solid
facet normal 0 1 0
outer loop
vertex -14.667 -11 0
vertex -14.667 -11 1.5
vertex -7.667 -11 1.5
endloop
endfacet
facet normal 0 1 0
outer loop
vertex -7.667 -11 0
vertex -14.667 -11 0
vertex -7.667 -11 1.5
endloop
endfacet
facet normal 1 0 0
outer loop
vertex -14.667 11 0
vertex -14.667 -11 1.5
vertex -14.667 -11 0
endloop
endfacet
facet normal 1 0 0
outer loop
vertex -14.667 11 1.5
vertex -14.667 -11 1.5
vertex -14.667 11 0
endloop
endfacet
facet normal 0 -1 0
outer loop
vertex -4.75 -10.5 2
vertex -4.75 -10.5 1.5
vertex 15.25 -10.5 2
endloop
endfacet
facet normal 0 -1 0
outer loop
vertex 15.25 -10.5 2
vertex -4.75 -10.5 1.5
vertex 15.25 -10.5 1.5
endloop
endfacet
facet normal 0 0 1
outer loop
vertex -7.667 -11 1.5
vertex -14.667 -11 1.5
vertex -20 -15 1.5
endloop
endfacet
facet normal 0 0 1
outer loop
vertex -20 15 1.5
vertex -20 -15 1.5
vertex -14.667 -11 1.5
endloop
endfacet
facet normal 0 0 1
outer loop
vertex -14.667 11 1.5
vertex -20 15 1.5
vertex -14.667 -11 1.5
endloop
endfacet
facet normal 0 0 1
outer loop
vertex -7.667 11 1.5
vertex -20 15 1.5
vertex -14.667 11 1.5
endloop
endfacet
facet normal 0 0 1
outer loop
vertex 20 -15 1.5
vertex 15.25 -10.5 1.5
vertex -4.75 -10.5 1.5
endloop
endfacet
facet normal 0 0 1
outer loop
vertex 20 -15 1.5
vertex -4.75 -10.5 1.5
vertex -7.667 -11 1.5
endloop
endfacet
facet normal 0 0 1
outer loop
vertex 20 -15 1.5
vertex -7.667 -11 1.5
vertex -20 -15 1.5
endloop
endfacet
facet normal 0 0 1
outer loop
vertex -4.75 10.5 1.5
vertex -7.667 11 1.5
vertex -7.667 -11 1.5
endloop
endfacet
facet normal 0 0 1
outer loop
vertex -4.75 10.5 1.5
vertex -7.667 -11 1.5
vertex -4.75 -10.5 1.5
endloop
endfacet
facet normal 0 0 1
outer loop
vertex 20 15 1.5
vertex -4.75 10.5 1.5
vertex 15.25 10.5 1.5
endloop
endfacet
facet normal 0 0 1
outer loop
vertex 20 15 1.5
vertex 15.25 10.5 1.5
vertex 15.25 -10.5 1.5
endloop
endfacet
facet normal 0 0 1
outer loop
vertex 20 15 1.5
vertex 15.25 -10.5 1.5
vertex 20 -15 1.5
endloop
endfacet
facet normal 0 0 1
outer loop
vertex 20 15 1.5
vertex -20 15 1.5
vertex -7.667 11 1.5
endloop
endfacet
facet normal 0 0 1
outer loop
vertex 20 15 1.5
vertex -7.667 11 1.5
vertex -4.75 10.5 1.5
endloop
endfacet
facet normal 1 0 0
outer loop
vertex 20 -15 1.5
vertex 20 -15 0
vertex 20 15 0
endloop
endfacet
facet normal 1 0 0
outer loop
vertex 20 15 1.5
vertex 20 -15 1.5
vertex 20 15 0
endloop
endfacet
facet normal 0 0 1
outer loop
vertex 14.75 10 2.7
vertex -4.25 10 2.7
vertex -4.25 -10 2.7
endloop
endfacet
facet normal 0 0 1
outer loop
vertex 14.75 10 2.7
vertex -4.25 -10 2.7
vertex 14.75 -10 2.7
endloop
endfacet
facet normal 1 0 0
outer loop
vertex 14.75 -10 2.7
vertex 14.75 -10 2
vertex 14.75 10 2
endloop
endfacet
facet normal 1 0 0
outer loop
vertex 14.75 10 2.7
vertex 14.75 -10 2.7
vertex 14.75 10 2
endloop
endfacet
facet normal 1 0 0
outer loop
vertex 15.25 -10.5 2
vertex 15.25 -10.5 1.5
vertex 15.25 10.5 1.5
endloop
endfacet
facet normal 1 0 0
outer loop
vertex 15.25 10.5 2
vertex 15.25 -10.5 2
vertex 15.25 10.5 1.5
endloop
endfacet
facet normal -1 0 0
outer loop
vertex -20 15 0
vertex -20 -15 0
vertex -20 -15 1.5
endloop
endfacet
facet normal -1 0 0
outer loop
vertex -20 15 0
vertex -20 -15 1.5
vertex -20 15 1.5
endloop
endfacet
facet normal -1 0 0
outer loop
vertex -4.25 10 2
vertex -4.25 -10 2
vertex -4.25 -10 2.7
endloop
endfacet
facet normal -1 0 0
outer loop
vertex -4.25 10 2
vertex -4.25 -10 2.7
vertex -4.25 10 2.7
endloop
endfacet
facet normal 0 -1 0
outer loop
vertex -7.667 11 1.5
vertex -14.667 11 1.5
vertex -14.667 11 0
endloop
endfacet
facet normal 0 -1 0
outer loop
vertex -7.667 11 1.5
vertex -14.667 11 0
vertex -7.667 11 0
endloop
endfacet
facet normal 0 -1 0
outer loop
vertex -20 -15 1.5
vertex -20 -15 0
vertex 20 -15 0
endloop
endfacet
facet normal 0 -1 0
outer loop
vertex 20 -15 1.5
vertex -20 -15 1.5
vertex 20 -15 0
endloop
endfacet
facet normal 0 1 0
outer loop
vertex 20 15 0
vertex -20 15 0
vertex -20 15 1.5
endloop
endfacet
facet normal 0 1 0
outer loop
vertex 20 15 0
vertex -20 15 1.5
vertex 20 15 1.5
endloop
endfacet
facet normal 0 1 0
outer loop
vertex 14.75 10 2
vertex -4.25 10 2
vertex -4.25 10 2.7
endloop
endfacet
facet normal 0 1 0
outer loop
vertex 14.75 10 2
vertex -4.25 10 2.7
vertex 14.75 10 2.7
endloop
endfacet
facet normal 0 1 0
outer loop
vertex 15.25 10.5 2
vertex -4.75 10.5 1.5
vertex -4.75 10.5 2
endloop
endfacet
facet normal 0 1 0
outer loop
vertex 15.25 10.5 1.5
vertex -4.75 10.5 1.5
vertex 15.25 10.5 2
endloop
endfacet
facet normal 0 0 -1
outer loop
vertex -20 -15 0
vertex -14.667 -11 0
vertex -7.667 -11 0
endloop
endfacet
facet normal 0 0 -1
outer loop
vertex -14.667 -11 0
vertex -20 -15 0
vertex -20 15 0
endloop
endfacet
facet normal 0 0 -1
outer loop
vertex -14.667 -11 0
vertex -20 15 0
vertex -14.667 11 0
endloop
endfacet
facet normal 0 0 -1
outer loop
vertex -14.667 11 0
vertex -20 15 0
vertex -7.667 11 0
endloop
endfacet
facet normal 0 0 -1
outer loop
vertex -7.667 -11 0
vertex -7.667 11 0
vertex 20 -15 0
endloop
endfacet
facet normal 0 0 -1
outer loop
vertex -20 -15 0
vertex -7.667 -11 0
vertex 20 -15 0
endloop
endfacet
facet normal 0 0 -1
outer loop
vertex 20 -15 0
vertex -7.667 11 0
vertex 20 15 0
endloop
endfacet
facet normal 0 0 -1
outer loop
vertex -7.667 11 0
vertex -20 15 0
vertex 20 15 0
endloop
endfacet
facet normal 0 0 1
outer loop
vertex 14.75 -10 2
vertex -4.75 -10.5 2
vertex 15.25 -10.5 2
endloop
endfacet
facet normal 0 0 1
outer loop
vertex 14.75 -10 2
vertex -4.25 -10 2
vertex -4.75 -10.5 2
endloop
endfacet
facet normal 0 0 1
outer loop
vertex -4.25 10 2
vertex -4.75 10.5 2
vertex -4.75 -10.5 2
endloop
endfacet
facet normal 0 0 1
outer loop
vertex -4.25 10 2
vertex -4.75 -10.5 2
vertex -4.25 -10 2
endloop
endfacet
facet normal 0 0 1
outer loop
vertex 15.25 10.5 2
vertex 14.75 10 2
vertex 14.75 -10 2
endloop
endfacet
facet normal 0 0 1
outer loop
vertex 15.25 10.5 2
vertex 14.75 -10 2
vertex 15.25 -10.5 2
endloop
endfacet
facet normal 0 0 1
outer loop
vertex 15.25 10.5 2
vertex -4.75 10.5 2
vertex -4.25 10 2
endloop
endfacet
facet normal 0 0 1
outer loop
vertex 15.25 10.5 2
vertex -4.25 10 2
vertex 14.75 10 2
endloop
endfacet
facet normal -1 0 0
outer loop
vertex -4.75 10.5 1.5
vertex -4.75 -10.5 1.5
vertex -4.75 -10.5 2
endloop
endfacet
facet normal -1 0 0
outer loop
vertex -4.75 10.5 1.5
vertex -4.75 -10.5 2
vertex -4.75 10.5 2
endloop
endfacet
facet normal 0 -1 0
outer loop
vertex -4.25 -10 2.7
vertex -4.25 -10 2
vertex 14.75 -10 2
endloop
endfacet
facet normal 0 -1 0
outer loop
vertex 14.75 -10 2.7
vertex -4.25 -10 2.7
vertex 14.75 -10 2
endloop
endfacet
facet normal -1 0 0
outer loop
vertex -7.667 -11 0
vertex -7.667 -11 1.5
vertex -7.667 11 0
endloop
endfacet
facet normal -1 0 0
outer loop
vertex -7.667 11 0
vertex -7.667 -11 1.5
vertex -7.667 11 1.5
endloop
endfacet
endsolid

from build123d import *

# Parameters (mm, degrees)
SKETCH1_W           = 40
SKETCH1_H           = 30
BOSS_EXTRUDE1_DEPTH = 1.5
SKETCH2_W           = 20
SKETCH2_H           = 21
BOSS_EXTRUDE2_DEPTH = 0.5
SKETCH4_W           = 19
SKETCH4_H           = 20
BOSS_EXTRUDE3_DEPTH = 0.7
SKETCH5_W           = 7
SKETCH5_H           = 22
CUT_EXTRUDE1_DEPTH  = 1.5


with BuildPart() as part:
    # Sketch1 → Boss-Extrude1 (new body)
    with BuildSketch(Plane.XY):
        Rectangle(SKETCH1_W, SKETCH1_H)
    extrude(amount=BOSS_EXTRUDE1_DEPTH)

    # Sketch2 → Boss-Extrude2 (add)
    with BuildSketch(Plane.XY.offset(1.5)):
        with Locations((5.25, 0)):
            Rectangle(SKETCH2_W, SKETCH2_H)
    extrude(amount=BOSS_EXTRUDE2_DEPTH)

    # Sketch4 → Boss-Extrude3 (add)
    with BuildSketch(Plane.XY.offset(2)):
        with Locations((5.25, 0)):
            Rectangle(SKETCH4_W, SKETCH4_H)
    extrude(amount=BOSS_EXTRUDE3_DEPTH)

    # Sketch5 → Cut-Extrude1 (cut)
    with BuildSketch(Plane.XY.offset(1.5)):
        with Locations((-11.166666, 0)):
            Rectangle(SKETCH5_W, SKETCH5_H)
    extrude(amount=-CUT_EXTRUDE1_DEPTH, mode=Mode.SUBTRACT)


solid = part.part
